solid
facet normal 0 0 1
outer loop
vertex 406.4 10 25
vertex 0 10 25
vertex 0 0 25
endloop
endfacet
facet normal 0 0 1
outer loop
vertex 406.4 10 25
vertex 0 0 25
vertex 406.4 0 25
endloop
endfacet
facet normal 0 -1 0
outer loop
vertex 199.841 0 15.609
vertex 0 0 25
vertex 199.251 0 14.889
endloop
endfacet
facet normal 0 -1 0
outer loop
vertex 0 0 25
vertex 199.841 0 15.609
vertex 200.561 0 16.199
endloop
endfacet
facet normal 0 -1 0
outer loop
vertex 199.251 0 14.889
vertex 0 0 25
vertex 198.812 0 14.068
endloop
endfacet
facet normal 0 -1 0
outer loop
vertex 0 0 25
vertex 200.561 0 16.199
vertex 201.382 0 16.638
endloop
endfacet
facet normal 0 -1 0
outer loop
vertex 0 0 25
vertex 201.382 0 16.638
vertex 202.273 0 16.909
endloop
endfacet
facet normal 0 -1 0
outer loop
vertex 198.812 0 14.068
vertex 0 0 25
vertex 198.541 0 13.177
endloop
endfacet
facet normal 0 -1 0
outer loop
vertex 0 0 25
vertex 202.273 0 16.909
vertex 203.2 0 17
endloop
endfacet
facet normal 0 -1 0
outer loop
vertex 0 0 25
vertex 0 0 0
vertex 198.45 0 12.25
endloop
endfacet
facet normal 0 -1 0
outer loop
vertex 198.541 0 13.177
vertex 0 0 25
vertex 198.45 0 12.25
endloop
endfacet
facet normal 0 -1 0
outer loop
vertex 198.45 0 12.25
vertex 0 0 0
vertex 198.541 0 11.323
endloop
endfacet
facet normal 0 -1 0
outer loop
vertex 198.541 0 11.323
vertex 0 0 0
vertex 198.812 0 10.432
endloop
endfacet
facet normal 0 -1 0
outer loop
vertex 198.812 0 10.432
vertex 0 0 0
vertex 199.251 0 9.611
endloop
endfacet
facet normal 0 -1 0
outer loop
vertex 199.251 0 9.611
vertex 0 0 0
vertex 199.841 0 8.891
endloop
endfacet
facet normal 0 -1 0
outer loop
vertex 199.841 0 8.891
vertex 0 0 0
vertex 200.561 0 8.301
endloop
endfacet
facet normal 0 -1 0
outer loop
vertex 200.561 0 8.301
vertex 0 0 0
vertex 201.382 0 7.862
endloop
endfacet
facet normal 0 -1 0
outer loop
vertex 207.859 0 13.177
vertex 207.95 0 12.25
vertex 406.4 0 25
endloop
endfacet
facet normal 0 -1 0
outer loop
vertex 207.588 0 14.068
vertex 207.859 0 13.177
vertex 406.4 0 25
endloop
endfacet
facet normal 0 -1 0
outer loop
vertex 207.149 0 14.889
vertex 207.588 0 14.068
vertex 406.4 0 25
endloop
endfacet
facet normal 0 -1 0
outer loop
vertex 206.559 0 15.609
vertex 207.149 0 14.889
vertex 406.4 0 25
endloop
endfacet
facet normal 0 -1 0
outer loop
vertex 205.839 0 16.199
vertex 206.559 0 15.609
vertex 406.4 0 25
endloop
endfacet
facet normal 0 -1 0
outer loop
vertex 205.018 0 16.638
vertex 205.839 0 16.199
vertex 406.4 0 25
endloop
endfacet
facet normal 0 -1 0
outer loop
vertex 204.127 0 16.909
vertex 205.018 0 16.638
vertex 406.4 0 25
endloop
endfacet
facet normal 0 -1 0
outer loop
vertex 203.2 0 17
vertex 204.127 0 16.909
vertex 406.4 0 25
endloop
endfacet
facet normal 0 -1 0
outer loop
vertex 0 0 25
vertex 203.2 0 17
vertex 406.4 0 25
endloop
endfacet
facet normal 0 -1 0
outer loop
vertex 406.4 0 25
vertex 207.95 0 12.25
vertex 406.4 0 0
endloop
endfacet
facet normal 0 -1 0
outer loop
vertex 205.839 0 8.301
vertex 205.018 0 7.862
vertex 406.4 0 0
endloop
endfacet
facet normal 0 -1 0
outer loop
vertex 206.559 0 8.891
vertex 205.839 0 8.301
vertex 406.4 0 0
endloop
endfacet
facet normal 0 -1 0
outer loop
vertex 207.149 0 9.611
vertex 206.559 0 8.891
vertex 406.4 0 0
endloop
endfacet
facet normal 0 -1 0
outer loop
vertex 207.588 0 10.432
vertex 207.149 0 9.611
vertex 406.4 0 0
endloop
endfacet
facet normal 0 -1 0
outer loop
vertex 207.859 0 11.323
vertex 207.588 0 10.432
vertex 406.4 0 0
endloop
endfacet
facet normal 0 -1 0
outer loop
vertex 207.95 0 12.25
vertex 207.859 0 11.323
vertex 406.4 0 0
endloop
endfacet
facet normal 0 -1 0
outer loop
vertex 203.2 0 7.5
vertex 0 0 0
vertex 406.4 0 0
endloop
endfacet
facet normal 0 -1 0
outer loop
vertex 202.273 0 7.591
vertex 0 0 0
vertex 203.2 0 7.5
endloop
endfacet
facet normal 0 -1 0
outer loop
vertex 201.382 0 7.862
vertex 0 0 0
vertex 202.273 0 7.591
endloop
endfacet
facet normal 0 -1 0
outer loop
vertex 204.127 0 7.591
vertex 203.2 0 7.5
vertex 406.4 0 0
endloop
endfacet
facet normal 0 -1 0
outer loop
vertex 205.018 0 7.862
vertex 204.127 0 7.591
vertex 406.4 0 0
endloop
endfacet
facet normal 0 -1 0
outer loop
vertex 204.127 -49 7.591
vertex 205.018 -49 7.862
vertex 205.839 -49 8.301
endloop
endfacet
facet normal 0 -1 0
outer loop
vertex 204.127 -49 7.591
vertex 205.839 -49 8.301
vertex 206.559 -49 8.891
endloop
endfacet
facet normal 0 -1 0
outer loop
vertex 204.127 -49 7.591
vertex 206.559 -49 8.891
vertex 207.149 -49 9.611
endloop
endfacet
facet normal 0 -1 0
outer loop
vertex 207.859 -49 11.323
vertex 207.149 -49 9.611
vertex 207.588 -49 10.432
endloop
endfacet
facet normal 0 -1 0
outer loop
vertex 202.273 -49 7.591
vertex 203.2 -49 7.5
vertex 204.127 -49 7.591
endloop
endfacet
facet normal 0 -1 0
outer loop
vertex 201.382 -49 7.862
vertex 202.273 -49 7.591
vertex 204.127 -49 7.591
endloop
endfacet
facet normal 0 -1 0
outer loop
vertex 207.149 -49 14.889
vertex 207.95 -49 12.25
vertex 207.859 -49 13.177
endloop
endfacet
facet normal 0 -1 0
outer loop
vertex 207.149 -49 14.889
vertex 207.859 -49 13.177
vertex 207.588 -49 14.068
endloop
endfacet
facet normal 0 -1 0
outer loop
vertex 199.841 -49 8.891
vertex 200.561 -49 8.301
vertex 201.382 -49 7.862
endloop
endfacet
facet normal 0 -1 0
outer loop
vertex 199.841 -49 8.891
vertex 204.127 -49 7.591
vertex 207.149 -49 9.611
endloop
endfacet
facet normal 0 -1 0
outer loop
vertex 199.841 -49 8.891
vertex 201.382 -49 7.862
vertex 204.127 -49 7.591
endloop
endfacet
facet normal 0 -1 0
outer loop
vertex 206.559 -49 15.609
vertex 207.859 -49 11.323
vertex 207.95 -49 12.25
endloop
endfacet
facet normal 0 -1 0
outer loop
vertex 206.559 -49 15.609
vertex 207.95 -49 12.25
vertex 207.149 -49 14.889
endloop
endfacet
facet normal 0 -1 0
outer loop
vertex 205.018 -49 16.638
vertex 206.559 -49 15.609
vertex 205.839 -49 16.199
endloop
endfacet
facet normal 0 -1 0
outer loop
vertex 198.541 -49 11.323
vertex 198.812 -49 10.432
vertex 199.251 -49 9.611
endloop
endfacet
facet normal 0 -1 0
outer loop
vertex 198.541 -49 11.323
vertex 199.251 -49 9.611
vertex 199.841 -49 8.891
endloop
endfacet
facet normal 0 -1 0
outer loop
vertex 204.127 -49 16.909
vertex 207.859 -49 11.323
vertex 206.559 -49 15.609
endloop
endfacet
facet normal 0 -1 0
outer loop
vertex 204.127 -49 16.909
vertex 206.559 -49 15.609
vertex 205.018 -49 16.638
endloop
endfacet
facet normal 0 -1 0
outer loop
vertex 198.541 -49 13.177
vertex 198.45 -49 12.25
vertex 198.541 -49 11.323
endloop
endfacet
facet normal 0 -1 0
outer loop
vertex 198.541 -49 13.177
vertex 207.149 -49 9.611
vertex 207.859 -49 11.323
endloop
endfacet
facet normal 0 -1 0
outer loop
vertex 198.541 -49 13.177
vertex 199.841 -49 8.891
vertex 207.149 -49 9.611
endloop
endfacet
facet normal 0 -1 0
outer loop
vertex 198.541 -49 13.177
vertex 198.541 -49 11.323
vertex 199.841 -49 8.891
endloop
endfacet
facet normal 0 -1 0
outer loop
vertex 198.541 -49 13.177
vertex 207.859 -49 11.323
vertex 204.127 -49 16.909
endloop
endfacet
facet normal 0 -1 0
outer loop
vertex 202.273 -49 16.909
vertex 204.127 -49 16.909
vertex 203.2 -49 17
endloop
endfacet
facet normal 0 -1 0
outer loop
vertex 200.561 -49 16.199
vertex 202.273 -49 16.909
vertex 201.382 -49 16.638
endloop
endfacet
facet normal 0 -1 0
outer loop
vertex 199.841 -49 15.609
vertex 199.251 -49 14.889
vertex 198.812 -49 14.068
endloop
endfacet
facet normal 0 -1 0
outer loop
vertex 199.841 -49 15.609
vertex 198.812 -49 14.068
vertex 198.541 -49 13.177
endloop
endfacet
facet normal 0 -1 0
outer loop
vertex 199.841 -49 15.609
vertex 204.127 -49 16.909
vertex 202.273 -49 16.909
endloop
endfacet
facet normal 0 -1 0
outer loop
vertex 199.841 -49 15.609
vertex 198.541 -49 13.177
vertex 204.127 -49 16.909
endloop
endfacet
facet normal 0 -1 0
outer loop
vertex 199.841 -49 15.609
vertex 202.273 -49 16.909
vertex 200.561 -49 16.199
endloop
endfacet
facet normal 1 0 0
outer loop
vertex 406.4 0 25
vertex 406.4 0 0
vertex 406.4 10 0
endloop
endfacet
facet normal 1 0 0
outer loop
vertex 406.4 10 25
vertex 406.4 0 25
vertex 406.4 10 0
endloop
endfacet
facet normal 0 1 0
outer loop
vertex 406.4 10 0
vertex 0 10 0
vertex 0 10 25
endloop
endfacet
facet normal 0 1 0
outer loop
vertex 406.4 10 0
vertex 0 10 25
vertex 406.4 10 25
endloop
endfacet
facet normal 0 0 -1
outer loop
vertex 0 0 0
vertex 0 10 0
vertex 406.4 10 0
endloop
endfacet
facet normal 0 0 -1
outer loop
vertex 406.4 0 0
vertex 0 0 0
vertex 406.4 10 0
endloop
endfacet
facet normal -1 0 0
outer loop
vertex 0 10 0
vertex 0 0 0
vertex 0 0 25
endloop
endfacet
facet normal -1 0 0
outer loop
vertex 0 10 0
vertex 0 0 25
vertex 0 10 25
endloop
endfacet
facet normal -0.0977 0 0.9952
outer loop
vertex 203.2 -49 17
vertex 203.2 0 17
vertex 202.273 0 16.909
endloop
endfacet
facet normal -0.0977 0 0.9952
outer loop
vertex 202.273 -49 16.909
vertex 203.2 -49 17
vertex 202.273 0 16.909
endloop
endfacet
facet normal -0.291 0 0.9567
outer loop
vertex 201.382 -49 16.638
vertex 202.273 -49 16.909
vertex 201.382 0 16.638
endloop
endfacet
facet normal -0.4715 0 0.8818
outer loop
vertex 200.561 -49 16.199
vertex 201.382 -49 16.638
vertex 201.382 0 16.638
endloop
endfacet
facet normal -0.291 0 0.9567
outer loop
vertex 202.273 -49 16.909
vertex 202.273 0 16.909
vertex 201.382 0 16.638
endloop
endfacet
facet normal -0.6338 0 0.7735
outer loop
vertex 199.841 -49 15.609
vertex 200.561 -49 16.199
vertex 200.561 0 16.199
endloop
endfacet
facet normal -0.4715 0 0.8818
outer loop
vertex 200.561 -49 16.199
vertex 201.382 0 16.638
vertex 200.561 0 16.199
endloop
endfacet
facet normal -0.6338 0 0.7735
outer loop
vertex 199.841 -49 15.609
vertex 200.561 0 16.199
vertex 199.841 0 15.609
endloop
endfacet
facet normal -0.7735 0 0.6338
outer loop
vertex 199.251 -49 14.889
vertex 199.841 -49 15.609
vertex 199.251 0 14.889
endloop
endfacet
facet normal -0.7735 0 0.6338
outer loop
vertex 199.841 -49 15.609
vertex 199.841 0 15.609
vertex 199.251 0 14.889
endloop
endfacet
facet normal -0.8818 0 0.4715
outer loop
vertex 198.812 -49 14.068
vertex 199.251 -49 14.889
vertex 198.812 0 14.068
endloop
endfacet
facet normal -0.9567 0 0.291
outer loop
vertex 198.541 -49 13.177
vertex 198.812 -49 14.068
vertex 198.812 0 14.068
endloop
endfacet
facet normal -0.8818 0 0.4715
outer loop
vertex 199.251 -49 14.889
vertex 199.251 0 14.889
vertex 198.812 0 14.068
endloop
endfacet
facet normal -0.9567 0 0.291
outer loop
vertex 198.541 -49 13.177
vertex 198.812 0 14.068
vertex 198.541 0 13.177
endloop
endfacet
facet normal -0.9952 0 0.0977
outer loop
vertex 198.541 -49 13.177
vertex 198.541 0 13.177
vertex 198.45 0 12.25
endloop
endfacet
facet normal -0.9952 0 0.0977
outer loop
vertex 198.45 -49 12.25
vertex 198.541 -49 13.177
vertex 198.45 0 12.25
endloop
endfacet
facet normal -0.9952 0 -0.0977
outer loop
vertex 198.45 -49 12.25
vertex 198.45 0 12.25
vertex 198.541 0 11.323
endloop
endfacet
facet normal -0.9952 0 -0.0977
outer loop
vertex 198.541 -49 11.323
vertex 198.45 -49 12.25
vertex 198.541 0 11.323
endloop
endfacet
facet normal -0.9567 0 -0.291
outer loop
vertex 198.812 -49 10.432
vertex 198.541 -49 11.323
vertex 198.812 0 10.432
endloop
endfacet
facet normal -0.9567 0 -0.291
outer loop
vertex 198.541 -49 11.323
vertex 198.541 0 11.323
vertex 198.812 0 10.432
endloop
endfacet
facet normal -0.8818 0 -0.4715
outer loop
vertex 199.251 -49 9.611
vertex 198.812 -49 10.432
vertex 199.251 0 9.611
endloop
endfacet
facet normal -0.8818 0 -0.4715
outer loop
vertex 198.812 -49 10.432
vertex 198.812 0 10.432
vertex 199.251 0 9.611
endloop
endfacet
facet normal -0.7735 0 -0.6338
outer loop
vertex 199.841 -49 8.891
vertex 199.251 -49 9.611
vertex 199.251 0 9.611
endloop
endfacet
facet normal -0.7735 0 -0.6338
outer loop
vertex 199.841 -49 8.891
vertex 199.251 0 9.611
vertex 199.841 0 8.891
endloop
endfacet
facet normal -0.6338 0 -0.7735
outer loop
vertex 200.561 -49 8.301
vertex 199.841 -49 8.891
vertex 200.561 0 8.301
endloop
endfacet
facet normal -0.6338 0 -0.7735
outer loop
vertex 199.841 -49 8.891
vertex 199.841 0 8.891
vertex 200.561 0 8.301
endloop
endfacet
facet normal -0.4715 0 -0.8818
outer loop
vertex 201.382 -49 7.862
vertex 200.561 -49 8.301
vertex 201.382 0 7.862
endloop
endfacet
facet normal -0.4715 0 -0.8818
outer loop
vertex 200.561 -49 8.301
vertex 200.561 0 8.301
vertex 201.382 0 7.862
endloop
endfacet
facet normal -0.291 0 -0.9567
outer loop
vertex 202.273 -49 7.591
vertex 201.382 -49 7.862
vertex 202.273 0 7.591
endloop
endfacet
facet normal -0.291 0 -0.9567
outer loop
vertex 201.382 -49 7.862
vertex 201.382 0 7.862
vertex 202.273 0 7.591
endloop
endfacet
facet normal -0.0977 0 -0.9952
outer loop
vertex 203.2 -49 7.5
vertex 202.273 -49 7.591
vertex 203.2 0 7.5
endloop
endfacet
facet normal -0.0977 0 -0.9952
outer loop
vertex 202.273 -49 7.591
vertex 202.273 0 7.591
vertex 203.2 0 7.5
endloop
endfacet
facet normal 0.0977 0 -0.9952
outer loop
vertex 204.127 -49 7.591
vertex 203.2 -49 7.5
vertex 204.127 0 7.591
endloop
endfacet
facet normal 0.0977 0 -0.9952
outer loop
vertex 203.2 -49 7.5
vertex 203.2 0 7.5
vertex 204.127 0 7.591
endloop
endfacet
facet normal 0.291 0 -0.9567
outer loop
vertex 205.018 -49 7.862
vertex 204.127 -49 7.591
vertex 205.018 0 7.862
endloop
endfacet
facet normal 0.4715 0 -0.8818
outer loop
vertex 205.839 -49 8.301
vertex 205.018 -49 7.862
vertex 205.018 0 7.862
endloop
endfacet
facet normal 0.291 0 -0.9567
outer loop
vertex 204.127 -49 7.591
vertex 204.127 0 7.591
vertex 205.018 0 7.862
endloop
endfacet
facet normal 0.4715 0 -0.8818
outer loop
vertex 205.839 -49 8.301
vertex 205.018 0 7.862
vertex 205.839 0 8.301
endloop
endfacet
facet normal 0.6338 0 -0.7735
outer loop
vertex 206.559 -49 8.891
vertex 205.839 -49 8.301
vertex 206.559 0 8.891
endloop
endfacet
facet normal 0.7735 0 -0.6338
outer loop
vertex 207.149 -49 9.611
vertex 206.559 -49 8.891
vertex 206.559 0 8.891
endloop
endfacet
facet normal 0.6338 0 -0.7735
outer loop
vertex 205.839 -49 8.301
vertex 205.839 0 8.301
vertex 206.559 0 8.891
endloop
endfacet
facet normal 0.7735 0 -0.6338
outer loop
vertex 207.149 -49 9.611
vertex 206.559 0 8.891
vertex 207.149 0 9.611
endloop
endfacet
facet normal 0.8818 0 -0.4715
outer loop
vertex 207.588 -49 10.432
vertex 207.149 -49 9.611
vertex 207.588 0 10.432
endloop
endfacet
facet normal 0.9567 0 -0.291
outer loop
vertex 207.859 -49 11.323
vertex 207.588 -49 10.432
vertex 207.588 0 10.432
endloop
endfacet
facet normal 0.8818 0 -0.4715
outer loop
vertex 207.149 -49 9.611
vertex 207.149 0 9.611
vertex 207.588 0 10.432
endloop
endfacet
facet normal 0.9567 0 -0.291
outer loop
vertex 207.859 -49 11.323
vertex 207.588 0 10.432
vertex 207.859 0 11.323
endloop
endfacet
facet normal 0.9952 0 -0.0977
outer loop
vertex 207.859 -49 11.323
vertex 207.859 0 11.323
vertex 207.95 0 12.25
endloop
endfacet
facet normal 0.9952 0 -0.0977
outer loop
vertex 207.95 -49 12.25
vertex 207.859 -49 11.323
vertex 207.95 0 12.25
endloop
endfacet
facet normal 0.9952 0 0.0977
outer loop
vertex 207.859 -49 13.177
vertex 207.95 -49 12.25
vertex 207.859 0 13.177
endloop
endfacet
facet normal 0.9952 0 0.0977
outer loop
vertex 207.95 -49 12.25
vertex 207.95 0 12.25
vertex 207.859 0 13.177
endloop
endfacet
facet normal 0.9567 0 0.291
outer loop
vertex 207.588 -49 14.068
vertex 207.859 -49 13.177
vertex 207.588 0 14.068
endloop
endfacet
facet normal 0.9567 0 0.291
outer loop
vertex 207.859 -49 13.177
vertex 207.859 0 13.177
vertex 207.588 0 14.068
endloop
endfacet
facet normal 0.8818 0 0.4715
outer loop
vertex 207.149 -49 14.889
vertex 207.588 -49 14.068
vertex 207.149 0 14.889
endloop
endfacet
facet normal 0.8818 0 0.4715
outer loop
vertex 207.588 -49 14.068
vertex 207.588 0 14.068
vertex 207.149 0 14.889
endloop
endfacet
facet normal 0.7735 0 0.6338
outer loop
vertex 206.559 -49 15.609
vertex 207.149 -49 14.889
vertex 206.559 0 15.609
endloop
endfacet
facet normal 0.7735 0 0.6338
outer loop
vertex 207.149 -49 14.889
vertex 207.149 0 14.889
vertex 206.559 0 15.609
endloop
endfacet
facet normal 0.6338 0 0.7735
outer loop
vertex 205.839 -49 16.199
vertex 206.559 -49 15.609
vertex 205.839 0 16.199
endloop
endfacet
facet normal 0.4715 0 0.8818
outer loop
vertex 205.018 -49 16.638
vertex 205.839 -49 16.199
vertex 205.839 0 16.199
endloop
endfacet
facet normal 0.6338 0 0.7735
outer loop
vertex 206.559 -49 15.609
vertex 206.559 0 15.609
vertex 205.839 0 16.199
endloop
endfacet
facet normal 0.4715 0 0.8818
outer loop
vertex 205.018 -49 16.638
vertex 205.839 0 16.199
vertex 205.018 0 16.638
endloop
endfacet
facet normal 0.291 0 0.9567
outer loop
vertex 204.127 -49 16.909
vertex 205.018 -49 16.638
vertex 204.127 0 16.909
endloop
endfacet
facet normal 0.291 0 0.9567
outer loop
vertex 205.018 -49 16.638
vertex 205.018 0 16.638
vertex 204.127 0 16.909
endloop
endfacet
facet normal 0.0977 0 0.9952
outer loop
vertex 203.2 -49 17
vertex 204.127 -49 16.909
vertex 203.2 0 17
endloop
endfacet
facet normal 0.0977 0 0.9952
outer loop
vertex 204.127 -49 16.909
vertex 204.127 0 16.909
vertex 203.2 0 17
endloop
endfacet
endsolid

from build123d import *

# Parameters (mm, degrees)
SKETCH1_W           = 406.4
SKETCH1_H           = 10
BOSS_EXTRUDE1_DEPTH = 25
SKETCH2_R           = 4.75
BOSS_EXTRUDE2_DEPTH = 49


with BuildPart() as part:
    # Sketch1 → Boss-Extrude1 (new body)
    with BuildSketch(Plane.XY):
        with Locations((203.2, 5)):
            Rectangle(SKETCH1_W, SKETCH1_H)
    extrude(amount=BOSS_EXTRUDE1_DEPTH)

    # Sketch2 → Boss-Extrude2 (add)
    with BuildSketch(Plane.XZ):
        with Locations(Location((203.2, 12.25, 0), (0, 0, 90))):
            Circle(SKETCH2_R)
    extrude(amount=BOSS_EXTRUDE2_DEPTH)


solid = part.part
